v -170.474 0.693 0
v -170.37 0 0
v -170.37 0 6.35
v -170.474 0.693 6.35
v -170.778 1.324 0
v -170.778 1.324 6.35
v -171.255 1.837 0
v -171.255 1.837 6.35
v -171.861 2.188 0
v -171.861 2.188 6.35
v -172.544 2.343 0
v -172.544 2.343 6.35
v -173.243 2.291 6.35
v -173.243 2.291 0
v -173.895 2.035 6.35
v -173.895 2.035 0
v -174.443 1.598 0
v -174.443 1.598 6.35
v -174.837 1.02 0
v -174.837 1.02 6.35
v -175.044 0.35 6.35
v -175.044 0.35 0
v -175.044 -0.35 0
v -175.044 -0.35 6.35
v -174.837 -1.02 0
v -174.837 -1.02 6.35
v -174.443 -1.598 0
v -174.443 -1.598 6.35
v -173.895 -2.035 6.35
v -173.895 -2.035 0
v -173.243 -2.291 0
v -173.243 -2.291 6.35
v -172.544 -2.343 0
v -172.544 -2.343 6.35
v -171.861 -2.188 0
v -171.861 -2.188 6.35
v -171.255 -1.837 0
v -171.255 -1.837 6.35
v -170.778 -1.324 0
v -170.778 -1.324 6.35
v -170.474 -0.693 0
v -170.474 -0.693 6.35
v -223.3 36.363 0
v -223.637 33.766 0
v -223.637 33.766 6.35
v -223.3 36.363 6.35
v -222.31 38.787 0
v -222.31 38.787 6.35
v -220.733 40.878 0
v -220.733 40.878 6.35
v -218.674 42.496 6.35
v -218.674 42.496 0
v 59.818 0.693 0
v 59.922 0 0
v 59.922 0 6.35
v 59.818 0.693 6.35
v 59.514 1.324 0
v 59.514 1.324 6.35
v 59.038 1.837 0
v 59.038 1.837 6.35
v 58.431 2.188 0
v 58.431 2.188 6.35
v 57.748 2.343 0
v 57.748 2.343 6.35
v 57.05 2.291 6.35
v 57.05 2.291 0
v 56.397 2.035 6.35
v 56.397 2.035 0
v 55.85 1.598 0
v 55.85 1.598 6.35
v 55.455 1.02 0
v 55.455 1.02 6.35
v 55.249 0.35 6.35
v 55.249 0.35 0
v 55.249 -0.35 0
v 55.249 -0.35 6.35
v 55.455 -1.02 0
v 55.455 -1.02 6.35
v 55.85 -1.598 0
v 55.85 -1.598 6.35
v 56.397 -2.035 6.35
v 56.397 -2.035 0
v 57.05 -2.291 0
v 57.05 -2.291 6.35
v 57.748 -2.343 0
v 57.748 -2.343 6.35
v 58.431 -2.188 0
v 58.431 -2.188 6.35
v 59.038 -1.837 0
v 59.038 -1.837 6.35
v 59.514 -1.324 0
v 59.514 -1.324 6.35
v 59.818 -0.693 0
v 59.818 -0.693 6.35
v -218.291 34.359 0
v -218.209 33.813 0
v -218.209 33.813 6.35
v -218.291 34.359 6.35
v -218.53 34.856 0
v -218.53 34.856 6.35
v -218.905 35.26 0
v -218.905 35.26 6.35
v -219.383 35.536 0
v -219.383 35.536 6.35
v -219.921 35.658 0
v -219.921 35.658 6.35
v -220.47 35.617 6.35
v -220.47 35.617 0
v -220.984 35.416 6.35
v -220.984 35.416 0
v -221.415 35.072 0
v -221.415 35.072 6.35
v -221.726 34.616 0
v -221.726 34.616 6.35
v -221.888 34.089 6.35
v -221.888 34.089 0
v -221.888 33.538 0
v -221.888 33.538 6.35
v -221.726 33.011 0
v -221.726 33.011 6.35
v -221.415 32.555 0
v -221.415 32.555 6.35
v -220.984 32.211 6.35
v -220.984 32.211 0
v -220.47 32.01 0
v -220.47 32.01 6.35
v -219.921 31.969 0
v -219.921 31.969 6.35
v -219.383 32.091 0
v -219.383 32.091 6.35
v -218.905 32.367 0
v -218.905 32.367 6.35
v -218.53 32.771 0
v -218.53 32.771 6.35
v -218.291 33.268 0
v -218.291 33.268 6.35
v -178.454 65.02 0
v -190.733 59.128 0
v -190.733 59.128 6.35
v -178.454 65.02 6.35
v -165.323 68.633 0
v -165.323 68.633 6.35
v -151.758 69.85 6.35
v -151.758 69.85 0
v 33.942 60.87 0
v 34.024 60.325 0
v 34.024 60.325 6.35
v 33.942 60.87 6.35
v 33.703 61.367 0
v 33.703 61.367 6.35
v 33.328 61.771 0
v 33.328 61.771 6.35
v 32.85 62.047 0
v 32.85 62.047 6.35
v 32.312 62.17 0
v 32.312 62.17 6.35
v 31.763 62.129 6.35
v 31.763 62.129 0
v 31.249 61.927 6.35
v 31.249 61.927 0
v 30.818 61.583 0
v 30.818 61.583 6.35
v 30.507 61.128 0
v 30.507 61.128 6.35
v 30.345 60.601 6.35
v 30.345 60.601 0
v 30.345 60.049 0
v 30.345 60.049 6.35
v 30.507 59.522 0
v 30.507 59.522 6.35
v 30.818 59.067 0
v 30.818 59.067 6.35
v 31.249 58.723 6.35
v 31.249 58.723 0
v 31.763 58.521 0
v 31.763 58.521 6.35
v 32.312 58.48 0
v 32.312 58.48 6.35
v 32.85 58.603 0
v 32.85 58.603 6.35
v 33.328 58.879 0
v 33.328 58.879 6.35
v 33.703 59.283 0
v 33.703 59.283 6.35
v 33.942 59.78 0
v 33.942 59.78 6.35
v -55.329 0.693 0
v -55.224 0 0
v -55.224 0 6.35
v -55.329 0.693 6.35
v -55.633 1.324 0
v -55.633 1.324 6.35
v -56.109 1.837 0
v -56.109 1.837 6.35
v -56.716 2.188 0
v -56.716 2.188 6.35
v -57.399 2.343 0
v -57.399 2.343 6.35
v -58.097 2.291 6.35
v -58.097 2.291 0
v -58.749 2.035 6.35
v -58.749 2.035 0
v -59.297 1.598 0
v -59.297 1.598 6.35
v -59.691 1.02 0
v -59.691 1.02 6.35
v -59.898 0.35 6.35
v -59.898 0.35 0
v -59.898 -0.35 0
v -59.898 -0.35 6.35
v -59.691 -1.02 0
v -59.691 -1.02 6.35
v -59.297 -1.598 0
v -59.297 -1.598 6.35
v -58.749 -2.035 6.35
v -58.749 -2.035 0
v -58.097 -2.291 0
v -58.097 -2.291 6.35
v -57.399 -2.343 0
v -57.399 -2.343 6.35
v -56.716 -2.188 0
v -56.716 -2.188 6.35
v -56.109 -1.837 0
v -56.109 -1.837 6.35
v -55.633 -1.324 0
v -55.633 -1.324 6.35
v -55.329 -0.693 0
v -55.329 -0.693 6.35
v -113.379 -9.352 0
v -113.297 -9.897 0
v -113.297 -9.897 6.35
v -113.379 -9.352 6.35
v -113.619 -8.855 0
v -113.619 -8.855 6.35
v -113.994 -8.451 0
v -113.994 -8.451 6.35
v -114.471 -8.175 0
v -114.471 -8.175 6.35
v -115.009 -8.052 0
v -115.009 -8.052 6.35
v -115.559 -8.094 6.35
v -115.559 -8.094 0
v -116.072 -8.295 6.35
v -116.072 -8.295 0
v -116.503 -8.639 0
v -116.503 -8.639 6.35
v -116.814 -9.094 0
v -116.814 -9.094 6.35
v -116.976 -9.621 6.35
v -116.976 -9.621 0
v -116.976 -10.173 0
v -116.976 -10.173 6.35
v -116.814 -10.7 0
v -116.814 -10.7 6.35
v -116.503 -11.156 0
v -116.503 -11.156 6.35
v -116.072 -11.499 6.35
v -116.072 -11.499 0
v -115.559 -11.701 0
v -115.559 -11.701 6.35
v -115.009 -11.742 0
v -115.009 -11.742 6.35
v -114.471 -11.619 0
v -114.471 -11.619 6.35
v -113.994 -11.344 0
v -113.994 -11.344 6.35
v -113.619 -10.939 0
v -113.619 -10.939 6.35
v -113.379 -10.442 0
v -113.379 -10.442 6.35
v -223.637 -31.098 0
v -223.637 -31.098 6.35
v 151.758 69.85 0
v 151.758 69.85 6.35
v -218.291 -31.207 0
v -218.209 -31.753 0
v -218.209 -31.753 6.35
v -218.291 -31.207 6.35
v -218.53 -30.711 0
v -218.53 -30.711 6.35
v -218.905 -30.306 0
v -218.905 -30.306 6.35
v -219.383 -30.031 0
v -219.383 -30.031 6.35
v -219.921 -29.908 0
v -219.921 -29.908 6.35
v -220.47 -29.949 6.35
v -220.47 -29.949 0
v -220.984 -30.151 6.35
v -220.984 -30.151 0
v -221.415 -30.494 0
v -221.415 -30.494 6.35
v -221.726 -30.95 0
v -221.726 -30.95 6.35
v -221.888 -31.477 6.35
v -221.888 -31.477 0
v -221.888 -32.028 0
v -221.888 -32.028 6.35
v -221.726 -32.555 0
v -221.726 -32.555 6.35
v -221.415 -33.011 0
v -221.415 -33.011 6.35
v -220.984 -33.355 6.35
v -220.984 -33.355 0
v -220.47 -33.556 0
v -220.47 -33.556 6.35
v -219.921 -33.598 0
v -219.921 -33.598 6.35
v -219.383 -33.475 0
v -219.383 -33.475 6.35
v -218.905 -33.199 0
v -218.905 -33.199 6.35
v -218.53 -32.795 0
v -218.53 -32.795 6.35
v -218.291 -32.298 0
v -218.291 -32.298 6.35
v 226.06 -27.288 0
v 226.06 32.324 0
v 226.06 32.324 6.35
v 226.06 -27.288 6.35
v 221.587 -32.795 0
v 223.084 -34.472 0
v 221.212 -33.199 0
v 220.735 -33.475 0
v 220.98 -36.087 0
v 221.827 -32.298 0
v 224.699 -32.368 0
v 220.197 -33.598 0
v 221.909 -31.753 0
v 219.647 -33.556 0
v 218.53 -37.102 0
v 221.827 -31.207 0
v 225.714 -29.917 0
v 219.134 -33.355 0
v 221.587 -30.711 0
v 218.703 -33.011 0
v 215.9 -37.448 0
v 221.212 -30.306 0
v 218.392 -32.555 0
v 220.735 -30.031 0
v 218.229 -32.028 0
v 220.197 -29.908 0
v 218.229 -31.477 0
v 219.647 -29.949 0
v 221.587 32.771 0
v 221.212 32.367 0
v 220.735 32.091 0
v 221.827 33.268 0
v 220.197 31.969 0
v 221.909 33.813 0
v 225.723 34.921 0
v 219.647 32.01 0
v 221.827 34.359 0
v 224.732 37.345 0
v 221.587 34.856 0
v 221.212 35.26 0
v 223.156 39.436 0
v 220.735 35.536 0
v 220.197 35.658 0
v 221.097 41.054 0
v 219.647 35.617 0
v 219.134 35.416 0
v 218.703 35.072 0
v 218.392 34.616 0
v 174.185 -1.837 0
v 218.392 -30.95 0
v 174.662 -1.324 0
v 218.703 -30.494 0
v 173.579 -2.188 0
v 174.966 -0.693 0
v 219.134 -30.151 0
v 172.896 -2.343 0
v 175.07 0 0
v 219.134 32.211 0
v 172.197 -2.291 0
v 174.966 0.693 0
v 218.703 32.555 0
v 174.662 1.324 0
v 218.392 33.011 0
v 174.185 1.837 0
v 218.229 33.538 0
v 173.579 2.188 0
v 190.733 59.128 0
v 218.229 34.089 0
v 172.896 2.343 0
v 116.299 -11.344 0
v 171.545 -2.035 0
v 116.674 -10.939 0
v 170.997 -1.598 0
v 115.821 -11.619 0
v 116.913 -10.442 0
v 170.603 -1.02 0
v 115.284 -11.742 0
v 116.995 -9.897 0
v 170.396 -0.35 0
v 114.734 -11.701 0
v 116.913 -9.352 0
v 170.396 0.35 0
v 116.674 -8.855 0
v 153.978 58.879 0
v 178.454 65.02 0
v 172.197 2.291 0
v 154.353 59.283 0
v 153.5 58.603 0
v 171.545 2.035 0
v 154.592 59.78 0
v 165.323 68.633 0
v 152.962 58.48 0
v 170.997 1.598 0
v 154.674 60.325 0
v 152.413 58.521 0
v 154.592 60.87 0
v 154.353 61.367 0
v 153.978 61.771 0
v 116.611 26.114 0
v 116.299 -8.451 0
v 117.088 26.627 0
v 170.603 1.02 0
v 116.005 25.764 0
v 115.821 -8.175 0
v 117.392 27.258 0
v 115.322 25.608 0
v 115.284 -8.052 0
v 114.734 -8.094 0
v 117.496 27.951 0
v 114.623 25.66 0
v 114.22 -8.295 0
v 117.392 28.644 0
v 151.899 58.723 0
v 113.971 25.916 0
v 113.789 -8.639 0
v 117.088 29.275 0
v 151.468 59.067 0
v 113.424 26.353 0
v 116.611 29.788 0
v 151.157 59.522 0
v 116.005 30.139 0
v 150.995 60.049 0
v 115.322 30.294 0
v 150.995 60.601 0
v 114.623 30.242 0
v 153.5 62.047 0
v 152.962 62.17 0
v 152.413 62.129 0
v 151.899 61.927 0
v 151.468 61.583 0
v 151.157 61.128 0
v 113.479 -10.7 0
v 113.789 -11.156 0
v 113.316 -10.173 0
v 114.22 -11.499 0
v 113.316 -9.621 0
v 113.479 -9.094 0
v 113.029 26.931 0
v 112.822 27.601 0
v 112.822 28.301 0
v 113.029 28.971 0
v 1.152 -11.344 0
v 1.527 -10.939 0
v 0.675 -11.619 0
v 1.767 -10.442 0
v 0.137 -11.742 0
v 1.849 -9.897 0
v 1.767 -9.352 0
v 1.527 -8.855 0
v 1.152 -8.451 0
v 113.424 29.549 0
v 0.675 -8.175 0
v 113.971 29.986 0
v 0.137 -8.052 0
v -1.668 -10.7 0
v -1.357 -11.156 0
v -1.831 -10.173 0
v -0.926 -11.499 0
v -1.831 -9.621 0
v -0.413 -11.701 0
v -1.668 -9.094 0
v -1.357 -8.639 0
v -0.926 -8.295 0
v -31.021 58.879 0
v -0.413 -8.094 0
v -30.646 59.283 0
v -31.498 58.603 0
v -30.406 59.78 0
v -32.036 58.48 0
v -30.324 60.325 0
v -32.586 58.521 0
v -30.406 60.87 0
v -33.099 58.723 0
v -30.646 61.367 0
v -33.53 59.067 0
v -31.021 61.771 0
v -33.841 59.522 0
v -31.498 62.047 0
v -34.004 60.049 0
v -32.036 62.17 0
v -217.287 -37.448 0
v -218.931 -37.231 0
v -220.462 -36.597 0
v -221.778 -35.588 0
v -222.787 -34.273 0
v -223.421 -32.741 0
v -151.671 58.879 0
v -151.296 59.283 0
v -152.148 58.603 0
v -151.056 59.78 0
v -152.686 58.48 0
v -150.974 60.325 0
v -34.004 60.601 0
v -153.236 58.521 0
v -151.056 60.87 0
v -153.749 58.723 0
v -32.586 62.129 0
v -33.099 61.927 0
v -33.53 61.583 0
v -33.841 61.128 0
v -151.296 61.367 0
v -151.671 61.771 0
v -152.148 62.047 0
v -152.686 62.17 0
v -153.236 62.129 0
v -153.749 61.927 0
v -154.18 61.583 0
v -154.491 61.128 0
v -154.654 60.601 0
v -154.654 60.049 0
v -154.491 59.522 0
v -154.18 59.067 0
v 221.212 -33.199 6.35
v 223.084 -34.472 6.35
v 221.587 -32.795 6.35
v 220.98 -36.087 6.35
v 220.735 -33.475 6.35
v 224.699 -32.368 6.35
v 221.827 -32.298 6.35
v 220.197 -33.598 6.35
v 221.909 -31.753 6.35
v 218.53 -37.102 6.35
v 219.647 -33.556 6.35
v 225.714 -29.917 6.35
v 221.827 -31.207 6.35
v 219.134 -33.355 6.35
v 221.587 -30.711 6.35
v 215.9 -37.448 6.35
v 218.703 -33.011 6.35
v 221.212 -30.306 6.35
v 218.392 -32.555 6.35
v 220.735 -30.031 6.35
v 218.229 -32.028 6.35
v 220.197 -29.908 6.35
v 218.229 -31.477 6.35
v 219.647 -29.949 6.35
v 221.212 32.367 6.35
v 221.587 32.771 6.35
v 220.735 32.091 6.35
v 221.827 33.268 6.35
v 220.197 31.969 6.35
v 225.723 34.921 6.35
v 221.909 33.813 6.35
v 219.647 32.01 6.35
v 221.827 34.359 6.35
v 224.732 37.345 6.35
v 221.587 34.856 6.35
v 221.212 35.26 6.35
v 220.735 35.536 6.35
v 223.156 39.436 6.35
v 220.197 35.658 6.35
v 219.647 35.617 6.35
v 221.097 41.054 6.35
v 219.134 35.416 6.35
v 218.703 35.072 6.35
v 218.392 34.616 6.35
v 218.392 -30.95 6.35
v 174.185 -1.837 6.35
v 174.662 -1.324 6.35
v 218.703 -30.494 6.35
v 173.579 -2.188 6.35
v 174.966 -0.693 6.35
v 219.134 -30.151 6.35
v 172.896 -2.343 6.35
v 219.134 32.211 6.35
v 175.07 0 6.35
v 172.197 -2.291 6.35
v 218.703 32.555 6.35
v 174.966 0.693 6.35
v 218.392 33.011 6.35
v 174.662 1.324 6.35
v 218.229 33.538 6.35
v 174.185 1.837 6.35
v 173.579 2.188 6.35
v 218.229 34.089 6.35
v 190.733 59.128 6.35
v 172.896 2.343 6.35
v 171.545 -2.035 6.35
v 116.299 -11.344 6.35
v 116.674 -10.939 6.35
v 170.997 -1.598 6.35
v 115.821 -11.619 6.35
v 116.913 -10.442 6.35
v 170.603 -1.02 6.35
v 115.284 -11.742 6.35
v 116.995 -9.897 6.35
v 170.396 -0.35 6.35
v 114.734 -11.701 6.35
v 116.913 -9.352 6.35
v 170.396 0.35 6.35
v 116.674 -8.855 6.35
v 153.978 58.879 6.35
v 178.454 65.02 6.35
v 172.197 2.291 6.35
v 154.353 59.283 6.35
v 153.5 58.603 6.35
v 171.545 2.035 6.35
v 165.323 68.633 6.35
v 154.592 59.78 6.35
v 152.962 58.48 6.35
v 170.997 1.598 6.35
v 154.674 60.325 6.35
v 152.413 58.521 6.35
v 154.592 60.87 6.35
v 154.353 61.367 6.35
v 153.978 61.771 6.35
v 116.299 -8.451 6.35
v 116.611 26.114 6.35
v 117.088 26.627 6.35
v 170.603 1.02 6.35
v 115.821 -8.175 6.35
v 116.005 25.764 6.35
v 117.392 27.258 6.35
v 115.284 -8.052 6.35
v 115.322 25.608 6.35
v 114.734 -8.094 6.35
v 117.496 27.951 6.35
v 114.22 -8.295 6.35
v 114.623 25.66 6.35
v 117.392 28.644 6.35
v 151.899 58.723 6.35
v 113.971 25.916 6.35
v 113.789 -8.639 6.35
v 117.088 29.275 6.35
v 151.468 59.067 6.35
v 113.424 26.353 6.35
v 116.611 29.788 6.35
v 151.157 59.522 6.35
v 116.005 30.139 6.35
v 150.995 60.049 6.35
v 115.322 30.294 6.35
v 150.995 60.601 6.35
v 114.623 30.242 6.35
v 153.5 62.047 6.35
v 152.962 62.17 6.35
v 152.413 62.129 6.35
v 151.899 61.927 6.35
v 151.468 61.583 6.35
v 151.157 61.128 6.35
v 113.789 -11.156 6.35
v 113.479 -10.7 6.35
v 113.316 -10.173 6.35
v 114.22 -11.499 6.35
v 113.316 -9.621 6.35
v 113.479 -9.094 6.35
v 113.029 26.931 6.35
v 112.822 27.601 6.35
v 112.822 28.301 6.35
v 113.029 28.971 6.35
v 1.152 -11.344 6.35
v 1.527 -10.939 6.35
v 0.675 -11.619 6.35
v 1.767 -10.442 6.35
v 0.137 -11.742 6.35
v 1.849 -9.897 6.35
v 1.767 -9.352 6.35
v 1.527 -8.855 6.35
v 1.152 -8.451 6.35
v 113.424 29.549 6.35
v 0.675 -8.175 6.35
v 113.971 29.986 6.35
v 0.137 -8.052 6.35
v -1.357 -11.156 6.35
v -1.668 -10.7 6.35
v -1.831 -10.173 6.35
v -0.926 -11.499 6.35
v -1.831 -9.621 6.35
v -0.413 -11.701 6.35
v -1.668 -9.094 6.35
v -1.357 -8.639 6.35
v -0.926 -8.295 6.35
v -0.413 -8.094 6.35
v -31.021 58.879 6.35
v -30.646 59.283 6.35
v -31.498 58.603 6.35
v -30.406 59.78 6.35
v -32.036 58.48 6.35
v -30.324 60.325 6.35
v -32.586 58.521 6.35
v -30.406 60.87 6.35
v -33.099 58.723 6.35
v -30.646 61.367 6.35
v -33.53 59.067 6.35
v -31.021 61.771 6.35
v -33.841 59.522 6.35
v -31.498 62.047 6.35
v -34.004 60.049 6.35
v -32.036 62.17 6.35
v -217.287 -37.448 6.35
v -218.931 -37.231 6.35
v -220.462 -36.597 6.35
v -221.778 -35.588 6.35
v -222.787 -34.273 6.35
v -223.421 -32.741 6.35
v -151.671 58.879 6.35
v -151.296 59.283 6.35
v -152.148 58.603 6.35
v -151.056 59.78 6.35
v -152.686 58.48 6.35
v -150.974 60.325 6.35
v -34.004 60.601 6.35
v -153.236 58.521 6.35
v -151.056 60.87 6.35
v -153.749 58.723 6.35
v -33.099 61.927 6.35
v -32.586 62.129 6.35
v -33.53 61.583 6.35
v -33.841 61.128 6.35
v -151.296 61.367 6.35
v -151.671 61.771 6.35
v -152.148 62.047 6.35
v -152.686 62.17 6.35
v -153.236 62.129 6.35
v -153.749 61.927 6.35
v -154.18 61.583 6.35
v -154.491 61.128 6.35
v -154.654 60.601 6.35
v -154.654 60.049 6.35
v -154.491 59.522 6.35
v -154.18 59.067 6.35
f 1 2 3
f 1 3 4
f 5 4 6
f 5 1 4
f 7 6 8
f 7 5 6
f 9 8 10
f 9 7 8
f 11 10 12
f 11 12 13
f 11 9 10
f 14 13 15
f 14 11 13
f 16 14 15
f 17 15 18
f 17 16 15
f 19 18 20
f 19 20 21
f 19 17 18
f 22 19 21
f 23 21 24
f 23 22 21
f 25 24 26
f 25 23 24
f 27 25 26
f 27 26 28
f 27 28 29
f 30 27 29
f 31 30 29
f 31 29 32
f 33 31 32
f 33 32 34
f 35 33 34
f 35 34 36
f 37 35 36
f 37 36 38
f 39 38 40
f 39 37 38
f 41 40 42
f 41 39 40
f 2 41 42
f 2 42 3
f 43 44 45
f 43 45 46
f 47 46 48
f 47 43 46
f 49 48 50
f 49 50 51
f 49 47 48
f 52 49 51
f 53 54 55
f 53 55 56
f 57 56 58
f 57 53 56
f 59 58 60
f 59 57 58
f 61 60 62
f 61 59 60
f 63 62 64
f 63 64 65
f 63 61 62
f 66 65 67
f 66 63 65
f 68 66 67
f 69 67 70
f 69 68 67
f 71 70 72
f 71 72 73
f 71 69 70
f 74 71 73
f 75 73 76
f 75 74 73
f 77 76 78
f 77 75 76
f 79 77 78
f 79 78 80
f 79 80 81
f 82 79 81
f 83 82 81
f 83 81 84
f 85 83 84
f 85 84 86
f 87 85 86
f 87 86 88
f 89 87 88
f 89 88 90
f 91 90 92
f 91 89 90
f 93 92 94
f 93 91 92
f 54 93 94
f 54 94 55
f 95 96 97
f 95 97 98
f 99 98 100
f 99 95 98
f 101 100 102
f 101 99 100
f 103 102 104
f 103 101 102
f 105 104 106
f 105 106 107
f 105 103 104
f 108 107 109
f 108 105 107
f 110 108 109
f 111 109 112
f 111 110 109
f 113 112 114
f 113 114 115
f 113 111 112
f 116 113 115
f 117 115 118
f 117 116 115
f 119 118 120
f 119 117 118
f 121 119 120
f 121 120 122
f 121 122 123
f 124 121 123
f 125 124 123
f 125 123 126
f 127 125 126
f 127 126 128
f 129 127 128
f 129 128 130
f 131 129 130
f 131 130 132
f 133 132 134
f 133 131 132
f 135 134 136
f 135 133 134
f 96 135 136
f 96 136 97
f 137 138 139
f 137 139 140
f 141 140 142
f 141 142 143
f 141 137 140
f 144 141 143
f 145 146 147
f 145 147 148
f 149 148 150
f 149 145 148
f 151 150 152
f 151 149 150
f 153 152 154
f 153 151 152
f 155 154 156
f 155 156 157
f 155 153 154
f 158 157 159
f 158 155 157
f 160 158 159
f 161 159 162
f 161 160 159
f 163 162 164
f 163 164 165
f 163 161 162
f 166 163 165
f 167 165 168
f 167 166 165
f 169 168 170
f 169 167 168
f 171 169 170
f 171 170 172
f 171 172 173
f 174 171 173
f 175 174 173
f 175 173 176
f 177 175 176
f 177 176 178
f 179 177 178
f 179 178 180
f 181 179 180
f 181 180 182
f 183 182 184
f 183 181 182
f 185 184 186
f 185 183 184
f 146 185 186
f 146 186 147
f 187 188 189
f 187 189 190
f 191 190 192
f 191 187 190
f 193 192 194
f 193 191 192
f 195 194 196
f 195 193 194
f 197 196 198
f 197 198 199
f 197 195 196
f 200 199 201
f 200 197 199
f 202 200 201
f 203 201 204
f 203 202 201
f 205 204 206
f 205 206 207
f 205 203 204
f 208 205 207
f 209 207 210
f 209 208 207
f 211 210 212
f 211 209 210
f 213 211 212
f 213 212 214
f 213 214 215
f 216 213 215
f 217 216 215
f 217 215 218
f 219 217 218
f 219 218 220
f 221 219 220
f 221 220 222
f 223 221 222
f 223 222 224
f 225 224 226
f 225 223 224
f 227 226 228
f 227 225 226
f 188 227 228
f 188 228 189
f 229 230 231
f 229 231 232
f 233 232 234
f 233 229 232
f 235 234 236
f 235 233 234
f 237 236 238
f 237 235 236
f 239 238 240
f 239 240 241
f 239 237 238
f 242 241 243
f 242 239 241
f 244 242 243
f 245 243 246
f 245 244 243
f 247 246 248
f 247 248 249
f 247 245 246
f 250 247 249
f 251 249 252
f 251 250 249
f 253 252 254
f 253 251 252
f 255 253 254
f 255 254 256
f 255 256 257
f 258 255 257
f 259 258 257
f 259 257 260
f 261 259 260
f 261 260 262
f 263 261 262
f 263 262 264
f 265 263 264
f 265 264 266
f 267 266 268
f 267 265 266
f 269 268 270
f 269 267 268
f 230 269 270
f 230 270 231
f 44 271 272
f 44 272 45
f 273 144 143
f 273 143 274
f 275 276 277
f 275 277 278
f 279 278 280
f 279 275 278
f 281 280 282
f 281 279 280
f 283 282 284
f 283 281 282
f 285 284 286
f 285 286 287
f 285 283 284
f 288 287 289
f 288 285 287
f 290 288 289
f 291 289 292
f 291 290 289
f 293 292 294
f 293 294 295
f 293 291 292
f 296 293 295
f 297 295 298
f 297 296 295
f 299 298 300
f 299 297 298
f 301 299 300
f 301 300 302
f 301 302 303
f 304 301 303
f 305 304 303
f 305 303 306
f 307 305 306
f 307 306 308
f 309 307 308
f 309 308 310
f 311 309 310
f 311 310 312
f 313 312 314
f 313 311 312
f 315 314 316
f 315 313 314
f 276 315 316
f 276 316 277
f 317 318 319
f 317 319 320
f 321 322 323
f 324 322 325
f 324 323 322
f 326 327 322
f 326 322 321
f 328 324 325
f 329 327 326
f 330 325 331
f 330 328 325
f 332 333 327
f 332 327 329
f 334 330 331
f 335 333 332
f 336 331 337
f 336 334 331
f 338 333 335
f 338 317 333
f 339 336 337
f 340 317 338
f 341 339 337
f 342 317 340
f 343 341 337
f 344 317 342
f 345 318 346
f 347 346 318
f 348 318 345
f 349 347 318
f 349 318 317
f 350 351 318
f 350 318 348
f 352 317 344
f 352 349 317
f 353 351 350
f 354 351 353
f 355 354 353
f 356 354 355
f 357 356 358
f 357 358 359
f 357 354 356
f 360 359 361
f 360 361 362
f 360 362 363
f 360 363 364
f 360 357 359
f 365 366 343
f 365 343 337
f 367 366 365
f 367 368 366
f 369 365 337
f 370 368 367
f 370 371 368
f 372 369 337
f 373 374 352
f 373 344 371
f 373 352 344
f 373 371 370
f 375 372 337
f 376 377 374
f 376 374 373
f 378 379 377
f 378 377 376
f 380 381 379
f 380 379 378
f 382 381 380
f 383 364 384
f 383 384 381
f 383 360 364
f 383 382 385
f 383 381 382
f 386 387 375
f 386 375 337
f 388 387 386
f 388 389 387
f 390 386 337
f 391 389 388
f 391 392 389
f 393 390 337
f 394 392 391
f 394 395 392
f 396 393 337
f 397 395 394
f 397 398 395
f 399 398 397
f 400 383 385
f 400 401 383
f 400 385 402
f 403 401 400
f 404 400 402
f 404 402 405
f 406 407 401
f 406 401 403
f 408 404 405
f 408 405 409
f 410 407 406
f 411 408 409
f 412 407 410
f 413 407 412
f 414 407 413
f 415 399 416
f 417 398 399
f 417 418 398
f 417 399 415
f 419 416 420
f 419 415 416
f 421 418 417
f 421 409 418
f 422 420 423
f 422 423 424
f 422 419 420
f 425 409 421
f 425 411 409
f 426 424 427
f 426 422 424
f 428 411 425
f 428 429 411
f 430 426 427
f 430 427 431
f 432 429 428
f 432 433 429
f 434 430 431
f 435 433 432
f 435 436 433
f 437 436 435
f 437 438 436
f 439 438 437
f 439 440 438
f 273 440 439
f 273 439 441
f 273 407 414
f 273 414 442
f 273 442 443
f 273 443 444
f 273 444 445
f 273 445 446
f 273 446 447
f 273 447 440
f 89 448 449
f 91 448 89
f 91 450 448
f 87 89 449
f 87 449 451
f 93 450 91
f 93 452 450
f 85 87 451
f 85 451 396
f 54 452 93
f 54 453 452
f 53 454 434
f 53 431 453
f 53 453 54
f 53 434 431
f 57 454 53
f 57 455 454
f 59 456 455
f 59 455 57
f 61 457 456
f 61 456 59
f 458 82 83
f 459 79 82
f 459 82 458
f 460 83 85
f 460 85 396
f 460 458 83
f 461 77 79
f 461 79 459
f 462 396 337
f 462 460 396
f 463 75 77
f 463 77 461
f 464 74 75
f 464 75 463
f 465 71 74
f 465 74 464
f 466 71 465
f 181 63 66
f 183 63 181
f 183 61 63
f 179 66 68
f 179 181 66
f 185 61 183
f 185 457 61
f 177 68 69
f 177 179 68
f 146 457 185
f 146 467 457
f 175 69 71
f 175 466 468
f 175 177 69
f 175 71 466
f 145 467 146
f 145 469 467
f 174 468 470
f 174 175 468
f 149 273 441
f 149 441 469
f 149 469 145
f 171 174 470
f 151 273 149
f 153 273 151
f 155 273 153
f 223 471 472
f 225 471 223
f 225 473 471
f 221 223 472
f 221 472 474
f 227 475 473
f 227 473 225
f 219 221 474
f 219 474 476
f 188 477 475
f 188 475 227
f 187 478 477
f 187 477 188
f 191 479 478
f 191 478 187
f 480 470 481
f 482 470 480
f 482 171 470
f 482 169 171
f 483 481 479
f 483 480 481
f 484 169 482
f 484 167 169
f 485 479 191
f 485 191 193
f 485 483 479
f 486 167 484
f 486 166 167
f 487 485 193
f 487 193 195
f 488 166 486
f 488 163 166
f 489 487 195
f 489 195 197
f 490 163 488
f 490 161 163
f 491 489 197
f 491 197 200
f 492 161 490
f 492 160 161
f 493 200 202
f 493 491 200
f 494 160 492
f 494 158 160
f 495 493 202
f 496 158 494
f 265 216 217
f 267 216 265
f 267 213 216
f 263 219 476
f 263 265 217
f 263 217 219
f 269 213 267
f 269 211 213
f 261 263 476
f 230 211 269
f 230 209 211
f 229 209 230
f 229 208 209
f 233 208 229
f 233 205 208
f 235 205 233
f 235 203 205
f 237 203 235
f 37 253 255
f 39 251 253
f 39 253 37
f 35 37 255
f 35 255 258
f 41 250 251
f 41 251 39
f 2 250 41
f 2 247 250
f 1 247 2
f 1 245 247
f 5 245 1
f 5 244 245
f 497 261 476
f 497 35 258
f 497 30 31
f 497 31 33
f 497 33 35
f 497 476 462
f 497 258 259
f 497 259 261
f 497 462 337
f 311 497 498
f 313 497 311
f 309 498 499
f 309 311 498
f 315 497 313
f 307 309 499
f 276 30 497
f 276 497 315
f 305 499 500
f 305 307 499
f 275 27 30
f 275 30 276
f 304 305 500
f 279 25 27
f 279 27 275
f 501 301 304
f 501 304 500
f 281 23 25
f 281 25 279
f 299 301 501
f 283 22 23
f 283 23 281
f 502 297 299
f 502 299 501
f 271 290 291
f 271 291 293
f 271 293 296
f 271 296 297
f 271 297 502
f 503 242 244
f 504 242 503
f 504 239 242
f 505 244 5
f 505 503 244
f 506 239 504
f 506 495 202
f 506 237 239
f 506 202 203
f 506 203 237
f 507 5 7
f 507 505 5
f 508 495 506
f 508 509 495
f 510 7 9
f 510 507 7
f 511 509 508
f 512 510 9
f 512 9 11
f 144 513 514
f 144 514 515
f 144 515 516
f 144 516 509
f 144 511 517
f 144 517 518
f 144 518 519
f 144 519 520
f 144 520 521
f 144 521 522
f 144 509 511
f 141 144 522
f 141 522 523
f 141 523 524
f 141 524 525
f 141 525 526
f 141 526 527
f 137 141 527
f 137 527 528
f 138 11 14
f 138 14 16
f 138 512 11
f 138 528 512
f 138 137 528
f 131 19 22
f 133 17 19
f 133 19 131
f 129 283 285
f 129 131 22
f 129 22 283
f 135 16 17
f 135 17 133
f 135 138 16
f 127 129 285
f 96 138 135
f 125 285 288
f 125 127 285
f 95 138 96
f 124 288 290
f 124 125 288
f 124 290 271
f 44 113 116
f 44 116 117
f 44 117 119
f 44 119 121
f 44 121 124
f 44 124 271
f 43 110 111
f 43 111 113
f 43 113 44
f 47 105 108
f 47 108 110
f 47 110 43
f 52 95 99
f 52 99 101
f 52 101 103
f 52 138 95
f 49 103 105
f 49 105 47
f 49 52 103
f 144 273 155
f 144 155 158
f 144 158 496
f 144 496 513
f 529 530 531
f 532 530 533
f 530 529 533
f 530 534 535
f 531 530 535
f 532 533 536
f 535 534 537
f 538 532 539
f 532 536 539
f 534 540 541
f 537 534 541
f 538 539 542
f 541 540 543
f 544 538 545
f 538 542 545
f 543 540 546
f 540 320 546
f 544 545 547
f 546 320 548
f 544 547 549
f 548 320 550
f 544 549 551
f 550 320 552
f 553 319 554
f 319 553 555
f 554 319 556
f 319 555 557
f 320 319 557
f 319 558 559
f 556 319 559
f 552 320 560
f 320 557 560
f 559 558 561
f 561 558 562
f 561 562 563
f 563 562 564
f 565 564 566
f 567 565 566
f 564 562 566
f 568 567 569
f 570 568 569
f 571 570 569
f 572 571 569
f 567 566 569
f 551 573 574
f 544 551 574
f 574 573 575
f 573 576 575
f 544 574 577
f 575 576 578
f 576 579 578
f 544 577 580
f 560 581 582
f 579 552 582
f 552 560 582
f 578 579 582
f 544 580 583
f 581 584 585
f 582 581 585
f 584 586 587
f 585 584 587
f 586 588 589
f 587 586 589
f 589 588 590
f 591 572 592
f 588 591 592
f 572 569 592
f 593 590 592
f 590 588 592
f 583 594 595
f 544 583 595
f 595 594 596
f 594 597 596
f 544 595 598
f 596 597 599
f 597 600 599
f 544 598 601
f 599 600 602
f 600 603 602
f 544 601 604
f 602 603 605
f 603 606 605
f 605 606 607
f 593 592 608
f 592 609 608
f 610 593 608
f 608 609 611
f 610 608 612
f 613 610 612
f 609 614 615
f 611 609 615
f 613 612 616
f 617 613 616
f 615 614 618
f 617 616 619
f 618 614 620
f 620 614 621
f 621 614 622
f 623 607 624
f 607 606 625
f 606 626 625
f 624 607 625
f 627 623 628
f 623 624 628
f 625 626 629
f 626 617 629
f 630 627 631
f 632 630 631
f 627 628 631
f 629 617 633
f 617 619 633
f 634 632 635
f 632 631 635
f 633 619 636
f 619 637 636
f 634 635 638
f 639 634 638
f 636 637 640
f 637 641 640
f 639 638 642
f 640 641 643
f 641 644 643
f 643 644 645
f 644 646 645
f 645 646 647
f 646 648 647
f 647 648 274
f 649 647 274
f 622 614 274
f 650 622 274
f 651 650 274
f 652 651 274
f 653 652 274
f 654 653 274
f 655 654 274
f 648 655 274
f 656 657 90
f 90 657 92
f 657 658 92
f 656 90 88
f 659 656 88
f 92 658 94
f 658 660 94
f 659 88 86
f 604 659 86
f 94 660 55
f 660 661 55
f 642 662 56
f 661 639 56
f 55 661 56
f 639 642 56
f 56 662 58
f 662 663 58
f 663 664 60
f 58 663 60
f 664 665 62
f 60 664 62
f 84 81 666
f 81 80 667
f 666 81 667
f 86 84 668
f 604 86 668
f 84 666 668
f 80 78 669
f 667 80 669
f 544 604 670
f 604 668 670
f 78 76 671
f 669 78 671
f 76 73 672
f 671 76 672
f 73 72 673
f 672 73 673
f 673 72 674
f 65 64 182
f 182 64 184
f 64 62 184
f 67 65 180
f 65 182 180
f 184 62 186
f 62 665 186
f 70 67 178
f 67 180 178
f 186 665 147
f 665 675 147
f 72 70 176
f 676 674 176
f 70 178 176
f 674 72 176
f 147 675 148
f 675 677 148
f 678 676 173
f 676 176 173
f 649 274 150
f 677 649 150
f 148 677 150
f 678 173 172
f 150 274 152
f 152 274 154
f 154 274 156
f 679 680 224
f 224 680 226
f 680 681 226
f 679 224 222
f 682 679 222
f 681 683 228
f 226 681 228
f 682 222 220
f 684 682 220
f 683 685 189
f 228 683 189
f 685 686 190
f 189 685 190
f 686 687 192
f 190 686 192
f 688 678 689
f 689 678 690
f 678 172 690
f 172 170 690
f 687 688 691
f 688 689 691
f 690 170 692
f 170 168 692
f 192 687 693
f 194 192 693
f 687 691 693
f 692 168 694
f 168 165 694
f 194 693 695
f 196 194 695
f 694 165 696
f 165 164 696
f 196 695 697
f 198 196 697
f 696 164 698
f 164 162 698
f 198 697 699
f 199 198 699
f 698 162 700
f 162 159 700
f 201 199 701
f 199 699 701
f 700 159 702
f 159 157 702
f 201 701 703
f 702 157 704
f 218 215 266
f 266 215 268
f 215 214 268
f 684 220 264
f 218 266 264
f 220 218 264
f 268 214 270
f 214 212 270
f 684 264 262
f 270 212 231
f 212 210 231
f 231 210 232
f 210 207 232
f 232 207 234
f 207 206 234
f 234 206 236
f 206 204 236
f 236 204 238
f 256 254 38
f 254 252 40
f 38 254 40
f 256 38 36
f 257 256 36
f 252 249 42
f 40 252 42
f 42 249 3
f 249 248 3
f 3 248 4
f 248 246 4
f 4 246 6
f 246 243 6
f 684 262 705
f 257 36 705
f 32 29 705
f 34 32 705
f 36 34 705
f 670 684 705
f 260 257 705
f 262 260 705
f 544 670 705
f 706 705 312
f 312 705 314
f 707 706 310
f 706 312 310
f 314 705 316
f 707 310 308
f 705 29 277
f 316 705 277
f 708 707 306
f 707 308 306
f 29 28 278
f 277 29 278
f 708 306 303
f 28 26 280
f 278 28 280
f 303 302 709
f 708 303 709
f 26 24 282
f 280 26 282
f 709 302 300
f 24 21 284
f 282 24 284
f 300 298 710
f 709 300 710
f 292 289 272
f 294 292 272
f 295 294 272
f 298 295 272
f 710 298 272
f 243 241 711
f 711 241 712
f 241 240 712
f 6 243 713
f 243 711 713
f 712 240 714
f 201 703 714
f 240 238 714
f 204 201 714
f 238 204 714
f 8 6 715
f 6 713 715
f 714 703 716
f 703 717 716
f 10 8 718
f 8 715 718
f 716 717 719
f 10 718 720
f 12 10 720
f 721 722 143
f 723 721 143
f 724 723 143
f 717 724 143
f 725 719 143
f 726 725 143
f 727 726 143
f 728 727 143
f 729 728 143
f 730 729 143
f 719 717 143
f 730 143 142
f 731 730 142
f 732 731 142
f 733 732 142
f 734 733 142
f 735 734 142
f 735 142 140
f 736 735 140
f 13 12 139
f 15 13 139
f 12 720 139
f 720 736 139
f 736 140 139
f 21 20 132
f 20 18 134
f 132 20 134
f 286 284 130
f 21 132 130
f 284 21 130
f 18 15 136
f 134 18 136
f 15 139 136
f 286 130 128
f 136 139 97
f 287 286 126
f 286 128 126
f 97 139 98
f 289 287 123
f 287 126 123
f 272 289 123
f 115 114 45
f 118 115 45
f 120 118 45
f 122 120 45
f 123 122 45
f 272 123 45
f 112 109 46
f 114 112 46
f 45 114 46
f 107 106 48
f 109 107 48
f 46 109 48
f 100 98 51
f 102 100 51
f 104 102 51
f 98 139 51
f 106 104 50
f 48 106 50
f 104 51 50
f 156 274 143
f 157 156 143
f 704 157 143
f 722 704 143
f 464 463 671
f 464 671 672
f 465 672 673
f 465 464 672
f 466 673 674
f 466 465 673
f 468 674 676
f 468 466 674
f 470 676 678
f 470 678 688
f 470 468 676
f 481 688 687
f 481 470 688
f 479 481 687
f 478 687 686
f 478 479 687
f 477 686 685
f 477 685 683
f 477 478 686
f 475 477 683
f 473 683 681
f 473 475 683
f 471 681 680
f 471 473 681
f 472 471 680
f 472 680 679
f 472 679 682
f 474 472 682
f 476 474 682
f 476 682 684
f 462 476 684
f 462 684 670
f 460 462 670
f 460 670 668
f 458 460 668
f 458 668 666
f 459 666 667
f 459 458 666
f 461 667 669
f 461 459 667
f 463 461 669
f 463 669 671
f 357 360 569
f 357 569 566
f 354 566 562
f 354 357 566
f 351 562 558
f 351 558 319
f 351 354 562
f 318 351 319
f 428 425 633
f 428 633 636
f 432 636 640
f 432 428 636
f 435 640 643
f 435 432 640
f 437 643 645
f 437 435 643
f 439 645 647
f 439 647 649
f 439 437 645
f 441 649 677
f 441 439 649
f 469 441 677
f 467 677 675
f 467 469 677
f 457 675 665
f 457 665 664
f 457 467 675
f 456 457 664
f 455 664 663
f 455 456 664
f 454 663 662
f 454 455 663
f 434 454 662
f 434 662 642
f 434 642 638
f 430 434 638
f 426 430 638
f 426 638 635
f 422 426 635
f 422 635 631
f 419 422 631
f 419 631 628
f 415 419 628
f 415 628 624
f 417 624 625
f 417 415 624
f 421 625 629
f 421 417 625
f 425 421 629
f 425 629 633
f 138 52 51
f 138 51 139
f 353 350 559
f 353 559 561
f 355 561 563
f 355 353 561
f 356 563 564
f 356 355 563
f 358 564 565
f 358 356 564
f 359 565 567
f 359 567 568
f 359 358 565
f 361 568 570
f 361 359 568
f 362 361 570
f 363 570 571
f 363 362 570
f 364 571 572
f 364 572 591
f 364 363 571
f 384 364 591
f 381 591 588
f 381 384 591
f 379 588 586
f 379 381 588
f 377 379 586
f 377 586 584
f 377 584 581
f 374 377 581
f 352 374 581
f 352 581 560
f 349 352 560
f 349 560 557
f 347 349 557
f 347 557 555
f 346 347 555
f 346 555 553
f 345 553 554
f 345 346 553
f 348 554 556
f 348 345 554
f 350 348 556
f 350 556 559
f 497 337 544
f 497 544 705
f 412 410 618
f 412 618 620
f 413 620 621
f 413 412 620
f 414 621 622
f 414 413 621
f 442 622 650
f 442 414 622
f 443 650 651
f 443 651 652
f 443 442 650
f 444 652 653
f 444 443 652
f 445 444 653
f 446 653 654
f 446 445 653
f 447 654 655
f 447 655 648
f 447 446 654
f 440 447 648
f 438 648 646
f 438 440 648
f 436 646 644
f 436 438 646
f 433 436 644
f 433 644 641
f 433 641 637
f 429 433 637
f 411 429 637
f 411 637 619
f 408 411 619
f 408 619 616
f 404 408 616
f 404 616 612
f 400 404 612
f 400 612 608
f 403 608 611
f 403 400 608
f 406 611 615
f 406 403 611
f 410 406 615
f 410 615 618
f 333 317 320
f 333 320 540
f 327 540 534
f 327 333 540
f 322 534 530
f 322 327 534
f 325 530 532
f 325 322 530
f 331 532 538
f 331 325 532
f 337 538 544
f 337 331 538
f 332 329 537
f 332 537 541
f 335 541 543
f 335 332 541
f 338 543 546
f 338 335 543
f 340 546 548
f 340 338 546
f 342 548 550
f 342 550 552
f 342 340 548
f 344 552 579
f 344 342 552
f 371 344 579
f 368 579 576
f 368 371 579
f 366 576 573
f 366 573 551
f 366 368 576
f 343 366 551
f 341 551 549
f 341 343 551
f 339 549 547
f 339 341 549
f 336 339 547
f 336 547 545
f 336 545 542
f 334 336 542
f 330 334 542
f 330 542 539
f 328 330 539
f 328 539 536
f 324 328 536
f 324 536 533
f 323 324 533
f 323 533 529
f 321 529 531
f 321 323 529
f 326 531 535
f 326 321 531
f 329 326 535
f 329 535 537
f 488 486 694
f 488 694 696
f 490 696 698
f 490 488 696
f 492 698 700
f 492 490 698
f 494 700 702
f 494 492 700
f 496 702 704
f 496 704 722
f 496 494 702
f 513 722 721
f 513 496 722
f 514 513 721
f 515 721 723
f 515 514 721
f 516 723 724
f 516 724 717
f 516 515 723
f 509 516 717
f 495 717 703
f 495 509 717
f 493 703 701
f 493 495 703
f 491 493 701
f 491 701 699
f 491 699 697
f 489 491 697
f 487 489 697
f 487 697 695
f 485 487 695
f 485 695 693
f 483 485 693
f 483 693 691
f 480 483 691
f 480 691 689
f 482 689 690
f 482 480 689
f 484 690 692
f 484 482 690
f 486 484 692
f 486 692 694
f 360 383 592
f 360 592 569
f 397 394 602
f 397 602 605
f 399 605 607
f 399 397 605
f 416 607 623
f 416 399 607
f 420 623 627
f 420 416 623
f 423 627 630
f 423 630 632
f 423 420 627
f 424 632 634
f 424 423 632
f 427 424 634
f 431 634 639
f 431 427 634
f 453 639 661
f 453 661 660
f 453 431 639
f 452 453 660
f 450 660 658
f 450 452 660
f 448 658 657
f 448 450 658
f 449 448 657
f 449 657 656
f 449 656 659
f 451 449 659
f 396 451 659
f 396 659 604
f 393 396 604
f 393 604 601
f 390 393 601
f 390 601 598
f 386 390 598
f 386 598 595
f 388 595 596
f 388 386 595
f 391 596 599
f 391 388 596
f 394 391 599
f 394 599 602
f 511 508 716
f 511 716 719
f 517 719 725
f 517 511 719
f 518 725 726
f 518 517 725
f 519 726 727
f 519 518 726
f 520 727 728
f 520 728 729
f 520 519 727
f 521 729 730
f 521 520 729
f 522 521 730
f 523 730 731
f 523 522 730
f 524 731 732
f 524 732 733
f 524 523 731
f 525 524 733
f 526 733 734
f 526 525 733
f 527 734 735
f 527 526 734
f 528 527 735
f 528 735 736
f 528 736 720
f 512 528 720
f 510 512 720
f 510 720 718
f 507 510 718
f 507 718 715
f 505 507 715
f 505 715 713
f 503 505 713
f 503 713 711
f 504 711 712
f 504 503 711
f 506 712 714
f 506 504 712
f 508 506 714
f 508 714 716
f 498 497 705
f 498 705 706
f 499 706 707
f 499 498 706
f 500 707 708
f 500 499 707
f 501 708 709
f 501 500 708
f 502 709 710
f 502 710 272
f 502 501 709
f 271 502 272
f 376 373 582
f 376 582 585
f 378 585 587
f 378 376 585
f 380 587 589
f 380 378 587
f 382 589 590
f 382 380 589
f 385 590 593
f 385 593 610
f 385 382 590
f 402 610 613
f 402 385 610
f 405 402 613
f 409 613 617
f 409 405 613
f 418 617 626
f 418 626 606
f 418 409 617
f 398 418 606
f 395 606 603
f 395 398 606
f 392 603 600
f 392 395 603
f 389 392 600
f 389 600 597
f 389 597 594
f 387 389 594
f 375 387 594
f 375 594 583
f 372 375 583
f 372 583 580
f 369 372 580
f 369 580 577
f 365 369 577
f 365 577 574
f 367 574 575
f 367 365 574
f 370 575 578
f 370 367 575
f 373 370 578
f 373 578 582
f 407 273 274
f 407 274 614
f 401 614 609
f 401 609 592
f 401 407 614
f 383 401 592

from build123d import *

# Parameters (mm, degrees)
SKETCH1_R           = 2.35
SKETCH1_R_2         = 1.85000011
SKETCH1_R_3         = 1.85
BOSS_EXTRUDE1_DEPTH = 6.35


with BuildPart() as part:
    # Sketch1 → Boss-Extrude1 (new body)
    with BuildSketch(Plane.XY):
        with BuildLine():
            Line((-149.618797812, -37.447756374), (-217.287383527, -37.447756374))
            ThreePointArc((-217.287383527, -37.447756374), (-221.777511587, -35.587884435), (-223.637383527, -31.097756374))
            Line((-223.637383527, -31.097756374), (-223.637383527, 33.765977424))
            ThreePointArc((-223.637383527, 33.765977424), (-222.309818874, 38.787300541), (-218.674059542, 42.49639313))
            Line((-218.674059542, 42.49639313), (-190.732762109, 59.128117792))
            ThreePointArc((-190.732762109, 59.128117792), (-171.969166759, 67.120649159), (-151.757691995, 69.85))
            Line((-151.757691995, 69.85), (151.757691995, 69.85))
            ThreePointArc((151.757691995, 69.85), (171.969166759, 67.120649159), (190.732762109, 59.128117792))
            Line((190.732762109, 59.128117792), (221.096676015, 41.054359515))
            ThreePointArc((221.096676015, 41.054359515), (224.732435347, 37.345266926), (226.06, 32.323943809))
            Line((226.06, 32.323943809), (226.06, -27.287756374))
            ThreePointArc((226.06, -27.287756374), (223.084204897, -34.471961271), (215.9, -37.447756374))
            Line((215.9, -37.447756374), (-149.618797812, -37.447756374))
        make_face()
        with Locations((-172.72, 0)):
            Circle(SKETCH1_R, mode=Mode.SUBTRACT)
        with Locations((-57.57418, 0)):
            Circle(SKETCH1_R, mode=Mode.SUBTRACT)
        with Locations((57.5724782, 0)):
            Circle(SKETCH1_R, mode=Mode.SUBTRACT)
        with Locations((172.72, 0)):
            Circle(SKETCH1_R, mode=Mode.SUBTRACT)
        with Locations((220.058830169, -31.752755237)):
            Circle(SKETCH1_R_2, mode=Mode.SUBTRACT)
        with Locations((115.1462391, 27.951065379)):
            Circle(SKETCH1_R, mode=Mode.SUBTRACT)
        with Locations((-220.058830169, -31.752755237)):
            Circle(SKETCH1_R_2, mode=Mode.SUBTRACT)
        with Locations((-32.17418, 60.325)):
            Circle(SKETCH1_R_3, mode=Mode.SUBTRACT)
        with Locations((-152.82418, 60.325)):
            Circle(SKETCH1_R_3, mode=Mode.SUBTRACT)
        with Locations((152.82418, 60.325)):
            Circle(SKETCH1_R_3, mode=Mode.SUBTRACT)
        with Locations((32.17418, 60.325)):
            Circle(SKETCH1_R_3, mode=Mode.SUBTRACT)
        with Locations((115.1453882, -9.897181959)):
            Circle(SKETCH1_R_3, mode=Mode.SUBTRACT)
        with Locations((-115.14709, -9.897181959)):
            Circle(SKETCH1_R_3, mode=Mode.SUBTRACT)
        with Locations((-0.00127, -9.897181959)):
            Circle(SKETCH1_R_3, mode=Mode.SUBTRACT)
        with Locations((220.058830169, 33.81345012)):
            Circle(SKETCH1_R_3, mode=Mode.SUBTRACT)
        with Locations((-220.058830169, 33.81345012)):
            Circle(SKETCH1_R_3, mode=Mode.SUBTRACT)
    extrude(amount=BOSS_EXTRUDE1_DEPTH)


solid = part.part
